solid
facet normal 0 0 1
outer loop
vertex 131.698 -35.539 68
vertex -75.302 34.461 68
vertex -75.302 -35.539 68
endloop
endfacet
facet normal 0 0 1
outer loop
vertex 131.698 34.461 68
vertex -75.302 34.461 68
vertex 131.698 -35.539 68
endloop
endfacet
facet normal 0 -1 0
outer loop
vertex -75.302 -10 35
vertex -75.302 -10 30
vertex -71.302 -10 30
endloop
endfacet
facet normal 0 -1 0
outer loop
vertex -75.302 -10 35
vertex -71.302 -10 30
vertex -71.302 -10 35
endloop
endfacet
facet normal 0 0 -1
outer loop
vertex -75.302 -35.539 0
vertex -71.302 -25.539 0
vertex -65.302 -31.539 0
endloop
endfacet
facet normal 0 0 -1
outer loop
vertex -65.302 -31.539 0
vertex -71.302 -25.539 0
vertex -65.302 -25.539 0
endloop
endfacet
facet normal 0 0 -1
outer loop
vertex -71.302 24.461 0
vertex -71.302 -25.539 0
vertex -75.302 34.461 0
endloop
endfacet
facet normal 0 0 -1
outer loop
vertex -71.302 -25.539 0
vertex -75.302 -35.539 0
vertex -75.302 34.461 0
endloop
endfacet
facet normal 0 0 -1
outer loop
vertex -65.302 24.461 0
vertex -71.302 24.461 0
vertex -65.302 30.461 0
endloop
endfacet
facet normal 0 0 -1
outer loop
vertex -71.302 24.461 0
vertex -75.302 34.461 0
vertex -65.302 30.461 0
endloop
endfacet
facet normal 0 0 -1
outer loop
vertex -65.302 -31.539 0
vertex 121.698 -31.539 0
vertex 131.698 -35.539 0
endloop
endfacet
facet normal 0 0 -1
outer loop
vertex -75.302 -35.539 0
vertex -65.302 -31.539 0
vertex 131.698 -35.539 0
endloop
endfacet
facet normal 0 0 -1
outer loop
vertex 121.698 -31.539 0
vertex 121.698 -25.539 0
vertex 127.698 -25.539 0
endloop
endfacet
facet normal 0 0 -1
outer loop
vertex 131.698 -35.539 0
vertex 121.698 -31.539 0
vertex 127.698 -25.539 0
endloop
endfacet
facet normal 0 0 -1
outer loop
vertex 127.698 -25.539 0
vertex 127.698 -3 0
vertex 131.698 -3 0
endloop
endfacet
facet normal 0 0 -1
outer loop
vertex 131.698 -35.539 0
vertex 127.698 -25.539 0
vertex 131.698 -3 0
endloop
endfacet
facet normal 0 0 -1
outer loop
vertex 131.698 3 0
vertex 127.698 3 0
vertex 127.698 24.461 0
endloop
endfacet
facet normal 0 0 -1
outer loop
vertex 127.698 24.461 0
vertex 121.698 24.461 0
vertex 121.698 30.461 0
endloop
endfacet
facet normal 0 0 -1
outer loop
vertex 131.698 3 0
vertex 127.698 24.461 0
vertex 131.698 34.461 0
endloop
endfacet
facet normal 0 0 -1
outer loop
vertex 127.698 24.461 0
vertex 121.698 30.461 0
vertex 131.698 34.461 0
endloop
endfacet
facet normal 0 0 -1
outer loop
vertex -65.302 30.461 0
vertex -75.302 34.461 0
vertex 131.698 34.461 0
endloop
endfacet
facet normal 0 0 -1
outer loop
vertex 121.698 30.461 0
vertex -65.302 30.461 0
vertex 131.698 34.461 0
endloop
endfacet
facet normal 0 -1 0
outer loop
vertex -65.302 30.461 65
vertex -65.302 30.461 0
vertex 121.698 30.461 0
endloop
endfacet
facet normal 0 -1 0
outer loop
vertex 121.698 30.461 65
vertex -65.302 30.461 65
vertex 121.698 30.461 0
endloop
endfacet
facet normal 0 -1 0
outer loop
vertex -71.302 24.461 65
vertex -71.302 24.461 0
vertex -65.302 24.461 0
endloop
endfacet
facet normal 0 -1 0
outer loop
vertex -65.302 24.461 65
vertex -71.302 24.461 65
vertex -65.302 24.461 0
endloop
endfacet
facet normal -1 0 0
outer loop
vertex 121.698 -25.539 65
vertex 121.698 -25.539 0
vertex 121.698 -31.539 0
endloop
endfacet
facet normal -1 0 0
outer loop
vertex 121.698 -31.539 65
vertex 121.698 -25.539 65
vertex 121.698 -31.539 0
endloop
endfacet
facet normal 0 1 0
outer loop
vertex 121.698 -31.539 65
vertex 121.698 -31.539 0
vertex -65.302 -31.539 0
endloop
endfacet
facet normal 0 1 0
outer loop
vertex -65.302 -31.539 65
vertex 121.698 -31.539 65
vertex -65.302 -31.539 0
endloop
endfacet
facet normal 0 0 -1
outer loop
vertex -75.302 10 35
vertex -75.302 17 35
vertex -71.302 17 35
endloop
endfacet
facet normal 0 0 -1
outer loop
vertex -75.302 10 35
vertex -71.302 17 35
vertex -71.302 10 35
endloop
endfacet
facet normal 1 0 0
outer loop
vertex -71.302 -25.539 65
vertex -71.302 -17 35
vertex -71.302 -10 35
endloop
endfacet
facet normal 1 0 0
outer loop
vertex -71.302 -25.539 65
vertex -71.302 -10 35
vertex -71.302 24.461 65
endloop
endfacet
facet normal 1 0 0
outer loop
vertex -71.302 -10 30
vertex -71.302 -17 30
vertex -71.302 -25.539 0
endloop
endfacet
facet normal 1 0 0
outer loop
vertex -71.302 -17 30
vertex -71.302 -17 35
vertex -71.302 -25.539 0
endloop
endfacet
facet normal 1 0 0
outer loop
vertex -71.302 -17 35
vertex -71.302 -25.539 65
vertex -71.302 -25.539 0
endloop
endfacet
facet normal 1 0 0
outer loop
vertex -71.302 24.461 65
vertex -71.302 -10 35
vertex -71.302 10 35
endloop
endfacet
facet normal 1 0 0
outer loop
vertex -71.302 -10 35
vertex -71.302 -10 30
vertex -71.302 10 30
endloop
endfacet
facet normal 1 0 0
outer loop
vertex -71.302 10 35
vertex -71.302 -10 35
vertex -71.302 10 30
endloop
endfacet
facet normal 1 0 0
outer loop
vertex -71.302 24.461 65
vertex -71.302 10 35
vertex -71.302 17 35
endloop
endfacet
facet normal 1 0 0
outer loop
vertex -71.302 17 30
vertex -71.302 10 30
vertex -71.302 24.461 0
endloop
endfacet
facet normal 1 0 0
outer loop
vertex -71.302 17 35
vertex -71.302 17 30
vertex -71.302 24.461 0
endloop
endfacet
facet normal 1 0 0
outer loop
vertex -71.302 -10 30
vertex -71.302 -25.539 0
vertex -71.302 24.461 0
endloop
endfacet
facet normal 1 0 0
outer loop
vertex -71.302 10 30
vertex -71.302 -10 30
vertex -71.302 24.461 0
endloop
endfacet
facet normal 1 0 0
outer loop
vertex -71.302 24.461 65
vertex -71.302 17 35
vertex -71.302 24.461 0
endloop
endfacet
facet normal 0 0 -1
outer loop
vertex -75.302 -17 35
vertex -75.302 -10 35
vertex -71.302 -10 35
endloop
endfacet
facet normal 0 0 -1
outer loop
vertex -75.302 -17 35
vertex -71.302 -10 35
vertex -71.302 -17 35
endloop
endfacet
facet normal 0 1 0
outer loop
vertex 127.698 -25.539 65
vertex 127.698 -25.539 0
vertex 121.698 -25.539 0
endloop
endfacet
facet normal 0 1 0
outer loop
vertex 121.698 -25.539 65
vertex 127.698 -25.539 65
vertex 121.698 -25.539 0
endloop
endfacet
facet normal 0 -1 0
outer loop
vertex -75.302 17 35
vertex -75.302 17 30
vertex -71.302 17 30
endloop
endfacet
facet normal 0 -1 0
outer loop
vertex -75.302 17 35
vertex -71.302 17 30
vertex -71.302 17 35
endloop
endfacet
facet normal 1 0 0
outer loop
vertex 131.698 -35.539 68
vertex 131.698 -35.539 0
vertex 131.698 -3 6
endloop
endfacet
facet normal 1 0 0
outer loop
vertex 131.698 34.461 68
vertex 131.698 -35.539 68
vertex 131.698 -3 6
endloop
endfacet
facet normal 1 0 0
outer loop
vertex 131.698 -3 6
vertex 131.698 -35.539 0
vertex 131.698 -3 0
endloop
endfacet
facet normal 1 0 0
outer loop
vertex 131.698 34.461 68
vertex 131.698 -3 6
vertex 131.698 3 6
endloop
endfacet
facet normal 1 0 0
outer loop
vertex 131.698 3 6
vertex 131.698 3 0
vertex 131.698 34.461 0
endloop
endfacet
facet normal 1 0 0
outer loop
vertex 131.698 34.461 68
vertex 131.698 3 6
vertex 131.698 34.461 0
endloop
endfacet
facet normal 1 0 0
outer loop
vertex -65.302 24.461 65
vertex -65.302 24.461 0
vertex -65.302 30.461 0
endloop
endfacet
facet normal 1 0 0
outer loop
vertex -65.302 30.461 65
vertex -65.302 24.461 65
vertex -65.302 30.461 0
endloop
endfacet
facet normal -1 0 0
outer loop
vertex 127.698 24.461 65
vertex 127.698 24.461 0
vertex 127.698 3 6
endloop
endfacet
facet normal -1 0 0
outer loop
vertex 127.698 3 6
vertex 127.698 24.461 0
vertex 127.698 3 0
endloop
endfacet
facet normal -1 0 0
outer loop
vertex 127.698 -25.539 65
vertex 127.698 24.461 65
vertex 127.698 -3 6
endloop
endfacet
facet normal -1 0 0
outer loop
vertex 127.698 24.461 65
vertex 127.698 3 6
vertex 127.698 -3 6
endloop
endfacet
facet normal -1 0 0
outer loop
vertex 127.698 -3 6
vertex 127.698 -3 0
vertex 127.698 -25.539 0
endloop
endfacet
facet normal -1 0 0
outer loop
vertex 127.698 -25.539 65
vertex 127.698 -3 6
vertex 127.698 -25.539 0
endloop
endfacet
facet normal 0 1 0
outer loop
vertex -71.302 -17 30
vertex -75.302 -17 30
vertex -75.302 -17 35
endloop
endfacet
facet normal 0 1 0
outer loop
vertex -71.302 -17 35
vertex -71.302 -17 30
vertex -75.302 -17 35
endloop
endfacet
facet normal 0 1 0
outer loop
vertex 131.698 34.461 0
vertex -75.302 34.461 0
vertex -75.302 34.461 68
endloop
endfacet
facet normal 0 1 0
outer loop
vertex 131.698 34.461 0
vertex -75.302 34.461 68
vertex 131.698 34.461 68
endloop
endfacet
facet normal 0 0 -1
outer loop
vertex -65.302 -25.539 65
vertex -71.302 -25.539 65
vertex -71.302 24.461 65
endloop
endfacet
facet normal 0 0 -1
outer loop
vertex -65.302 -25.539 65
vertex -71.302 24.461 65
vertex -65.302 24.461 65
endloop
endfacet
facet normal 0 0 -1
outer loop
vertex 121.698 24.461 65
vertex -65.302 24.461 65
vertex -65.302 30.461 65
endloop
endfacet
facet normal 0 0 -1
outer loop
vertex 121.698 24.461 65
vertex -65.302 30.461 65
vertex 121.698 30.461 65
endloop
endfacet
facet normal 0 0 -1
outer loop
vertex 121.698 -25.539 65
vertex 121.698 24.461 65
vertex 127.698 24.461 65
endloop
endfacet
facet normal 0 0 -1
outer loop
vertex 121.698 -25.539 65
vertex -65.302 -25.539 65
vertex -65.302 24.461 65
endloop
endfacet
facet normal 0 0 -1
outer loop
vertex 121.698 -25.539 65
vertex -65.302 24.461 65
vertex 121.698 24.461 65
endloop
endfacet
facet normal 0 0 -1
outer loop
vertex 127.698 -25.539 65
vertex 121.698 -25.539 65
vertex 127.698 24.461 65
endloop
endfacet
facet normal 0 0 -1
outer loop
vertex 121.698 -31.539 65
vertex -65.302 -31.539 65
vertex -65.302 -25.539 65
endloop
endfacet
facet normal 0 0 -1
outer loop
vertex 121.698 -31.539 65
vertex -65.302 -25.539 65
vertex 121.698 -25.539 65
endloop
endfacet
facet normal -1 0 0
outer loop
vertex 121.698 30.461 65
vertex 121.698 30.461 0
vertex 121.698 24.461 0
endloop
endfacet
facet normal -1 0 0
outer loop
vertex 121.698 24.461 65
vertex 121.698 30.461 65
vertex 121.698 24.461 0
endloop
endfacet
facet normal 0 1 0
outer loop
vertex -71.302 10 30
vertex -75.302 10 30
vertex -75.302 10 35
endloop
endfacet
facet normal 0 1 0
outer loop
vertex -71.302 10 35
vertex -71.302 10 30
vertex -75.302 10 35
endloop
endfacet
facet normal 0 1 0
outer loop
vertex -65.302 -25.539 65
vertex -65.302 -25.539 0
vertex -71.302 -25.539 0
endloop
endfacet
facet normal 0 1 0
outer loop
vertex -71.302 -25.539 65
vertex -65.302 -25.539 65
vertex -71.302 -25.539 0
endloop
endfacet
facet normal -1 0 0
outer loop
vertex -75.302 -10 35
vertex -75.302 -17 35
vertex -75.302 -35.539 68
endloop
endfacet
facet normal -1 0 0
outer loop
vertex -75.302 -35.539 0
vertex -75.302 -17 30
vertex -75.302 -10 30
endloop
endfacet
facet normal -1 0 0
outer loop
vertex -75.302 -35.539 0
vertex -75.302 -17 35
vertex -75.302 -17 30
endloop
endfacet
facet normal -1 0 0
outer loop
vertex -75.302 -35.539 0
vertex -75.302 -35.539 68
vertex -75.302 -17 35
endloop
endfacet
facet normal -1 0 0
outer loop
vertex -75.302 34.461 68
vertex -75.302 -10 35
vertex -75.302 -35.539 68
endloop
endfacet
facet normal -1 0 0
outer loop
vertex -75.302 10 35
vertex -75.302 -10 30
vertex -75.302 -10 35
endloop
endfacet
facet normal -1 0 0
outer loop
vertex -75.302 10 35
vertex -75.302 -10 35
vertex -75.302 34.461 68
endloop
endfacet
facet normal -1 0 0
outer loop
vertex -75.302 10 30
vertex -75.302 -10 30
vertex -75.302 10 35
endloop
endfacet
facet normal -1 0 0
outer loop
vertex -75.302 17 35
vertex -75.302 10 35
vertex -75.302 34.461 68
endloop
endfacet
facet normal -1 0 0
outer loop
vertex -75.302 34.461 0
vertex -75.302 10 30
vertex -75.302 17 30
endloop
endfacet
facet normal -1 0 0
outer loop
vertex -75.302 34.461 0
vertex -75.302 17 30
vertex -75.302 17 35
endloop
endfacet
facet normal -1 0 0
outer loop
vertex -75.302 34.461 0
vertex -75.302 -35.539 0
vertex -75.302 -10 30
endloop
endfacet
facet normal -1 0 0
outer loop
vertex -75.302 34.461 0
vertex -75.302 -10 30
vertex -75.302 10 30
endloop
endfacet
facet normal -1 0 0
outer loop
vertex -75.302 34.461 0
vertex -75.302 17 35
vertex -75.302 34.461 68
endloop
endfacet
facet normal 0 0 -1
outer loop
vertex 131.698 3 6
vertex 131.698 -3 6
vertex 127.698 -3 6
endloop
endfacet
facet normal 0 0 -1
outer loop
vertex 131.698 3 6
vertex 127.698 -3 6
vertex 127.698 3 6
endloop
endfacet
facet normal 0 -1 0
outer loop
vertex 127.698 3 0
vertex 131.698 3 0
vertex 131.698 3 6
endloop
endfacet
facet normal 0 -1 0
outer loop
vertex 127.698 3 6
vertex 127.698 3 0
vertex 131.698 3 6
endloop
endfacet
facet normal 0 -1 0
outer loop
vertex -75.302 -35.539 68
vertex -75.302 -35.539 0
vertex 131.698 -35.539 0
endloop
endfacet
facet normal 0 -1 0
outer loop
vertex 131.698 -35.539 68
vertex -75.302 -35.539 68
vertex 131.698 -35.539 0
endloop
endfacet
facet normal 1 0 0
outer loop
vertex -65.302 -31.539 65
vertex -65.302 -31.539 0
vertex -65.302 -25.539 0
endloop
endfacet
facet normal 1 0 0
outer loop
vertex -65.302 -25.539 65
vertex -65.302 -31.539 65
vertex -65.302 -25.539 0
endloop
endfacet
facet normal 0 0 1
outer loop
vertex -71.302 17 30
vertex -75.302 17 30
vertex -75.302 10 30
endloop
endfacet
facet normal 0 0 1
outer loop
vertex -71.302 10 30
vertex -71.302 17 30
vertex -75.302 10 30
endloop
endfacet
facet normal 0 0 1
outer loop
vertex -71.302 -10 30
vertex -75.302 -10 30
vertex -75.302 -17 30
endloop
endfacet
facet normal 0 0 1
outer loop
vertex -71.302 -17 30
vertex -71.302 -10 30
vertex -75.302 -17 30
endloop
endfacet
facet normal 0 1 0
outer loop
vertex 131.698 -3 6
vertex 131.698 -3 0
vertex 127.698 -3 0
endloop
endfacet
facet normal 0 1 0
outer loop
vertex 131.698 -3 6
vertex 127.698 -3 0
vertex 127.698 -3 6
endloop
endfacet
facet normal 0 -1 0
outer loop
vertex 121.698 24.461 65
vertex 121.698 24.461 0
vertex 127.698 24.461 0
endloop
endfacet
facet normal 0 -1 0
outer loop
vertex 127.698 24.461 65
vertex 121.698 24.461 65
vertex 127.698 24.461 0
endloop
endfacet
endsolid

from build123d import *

# Parameters (mm, degrees)
SKETCH006_W     = 207
SKETCH006_H     = 70
PAD002_DEPTH    = 68
POCKET_DEPTH    = 65
SKETCH_W        = 7
SKETCH_H        = 5
POCKET001_DEPTH = 20
SKETCH008_W     = 6
SKETCH008_H     = 6
POCKET002_DEPTH = 10


with BuildPart() as part:
    # Sketch006 → Pad002 (new body)
    with BuildSketch(Plane.XY):
        with Locations((28.19796, -0.538714)):
            Rectangle(SKETCH006_W, SKETCH006_H)
    extrude(amount=PAD002_DEPTH)

    # Sketch007 (on Face5 of Pad002) → Pocket (cut)
    with BuildSketch(Plane(origin=(0, 0, 0), x_dir=(1, 0, 0), z_dir=(0, 0, -1))):
        Polygon((-65.30204, 31.538714), (-65.30204, 25.538714), (-71.30204, 25.538714), (-71.30204, -24.461286), (-65.30204, -24.461286), (-65.30204, -30.461286), (121.69796, -30.461286), (121.69796, -24.461286), (127.69796, -24.461286), (127.69796, 25.538714), (121.69796, 25.538714), (121.69796, 31.538714), align=None)
    extrude(amount=-POCKET_DEPTH, mode=Mode.SUBTRACT)

    # Sketch (on Face4 of Pad002) → Pocket001 (cut)
    with BuildSketch(Plane(origin=(-75.30204, 0, 0), x_dir=(0, -1, 0), z_dir=(-1, 0, 0))):
        with Locations((-13.5, 32.5)):
            Rectangle(SKETCH_W, SKETCH_H)
        with Locations((13.5, 32.5)):
            Rectangle(SKETCH_W, SKETCH_H)
    extrude(amount=-POCKET001_DEPTH, mode=Mode.SUBTRACT)

    # Sketch008 (on Face2 of Pad002) → Pocket002 (cut)
    with BuildSketch(Plane.YZ.offset(131.69796)):
        with Locations((0, 3)):
            Rectangle(SKETCH008_W, SKETCH008_H)
    extrude(amount=-POCKET002_DEPTH, mode=Mode.SUBTRACT)


solid = part.part
